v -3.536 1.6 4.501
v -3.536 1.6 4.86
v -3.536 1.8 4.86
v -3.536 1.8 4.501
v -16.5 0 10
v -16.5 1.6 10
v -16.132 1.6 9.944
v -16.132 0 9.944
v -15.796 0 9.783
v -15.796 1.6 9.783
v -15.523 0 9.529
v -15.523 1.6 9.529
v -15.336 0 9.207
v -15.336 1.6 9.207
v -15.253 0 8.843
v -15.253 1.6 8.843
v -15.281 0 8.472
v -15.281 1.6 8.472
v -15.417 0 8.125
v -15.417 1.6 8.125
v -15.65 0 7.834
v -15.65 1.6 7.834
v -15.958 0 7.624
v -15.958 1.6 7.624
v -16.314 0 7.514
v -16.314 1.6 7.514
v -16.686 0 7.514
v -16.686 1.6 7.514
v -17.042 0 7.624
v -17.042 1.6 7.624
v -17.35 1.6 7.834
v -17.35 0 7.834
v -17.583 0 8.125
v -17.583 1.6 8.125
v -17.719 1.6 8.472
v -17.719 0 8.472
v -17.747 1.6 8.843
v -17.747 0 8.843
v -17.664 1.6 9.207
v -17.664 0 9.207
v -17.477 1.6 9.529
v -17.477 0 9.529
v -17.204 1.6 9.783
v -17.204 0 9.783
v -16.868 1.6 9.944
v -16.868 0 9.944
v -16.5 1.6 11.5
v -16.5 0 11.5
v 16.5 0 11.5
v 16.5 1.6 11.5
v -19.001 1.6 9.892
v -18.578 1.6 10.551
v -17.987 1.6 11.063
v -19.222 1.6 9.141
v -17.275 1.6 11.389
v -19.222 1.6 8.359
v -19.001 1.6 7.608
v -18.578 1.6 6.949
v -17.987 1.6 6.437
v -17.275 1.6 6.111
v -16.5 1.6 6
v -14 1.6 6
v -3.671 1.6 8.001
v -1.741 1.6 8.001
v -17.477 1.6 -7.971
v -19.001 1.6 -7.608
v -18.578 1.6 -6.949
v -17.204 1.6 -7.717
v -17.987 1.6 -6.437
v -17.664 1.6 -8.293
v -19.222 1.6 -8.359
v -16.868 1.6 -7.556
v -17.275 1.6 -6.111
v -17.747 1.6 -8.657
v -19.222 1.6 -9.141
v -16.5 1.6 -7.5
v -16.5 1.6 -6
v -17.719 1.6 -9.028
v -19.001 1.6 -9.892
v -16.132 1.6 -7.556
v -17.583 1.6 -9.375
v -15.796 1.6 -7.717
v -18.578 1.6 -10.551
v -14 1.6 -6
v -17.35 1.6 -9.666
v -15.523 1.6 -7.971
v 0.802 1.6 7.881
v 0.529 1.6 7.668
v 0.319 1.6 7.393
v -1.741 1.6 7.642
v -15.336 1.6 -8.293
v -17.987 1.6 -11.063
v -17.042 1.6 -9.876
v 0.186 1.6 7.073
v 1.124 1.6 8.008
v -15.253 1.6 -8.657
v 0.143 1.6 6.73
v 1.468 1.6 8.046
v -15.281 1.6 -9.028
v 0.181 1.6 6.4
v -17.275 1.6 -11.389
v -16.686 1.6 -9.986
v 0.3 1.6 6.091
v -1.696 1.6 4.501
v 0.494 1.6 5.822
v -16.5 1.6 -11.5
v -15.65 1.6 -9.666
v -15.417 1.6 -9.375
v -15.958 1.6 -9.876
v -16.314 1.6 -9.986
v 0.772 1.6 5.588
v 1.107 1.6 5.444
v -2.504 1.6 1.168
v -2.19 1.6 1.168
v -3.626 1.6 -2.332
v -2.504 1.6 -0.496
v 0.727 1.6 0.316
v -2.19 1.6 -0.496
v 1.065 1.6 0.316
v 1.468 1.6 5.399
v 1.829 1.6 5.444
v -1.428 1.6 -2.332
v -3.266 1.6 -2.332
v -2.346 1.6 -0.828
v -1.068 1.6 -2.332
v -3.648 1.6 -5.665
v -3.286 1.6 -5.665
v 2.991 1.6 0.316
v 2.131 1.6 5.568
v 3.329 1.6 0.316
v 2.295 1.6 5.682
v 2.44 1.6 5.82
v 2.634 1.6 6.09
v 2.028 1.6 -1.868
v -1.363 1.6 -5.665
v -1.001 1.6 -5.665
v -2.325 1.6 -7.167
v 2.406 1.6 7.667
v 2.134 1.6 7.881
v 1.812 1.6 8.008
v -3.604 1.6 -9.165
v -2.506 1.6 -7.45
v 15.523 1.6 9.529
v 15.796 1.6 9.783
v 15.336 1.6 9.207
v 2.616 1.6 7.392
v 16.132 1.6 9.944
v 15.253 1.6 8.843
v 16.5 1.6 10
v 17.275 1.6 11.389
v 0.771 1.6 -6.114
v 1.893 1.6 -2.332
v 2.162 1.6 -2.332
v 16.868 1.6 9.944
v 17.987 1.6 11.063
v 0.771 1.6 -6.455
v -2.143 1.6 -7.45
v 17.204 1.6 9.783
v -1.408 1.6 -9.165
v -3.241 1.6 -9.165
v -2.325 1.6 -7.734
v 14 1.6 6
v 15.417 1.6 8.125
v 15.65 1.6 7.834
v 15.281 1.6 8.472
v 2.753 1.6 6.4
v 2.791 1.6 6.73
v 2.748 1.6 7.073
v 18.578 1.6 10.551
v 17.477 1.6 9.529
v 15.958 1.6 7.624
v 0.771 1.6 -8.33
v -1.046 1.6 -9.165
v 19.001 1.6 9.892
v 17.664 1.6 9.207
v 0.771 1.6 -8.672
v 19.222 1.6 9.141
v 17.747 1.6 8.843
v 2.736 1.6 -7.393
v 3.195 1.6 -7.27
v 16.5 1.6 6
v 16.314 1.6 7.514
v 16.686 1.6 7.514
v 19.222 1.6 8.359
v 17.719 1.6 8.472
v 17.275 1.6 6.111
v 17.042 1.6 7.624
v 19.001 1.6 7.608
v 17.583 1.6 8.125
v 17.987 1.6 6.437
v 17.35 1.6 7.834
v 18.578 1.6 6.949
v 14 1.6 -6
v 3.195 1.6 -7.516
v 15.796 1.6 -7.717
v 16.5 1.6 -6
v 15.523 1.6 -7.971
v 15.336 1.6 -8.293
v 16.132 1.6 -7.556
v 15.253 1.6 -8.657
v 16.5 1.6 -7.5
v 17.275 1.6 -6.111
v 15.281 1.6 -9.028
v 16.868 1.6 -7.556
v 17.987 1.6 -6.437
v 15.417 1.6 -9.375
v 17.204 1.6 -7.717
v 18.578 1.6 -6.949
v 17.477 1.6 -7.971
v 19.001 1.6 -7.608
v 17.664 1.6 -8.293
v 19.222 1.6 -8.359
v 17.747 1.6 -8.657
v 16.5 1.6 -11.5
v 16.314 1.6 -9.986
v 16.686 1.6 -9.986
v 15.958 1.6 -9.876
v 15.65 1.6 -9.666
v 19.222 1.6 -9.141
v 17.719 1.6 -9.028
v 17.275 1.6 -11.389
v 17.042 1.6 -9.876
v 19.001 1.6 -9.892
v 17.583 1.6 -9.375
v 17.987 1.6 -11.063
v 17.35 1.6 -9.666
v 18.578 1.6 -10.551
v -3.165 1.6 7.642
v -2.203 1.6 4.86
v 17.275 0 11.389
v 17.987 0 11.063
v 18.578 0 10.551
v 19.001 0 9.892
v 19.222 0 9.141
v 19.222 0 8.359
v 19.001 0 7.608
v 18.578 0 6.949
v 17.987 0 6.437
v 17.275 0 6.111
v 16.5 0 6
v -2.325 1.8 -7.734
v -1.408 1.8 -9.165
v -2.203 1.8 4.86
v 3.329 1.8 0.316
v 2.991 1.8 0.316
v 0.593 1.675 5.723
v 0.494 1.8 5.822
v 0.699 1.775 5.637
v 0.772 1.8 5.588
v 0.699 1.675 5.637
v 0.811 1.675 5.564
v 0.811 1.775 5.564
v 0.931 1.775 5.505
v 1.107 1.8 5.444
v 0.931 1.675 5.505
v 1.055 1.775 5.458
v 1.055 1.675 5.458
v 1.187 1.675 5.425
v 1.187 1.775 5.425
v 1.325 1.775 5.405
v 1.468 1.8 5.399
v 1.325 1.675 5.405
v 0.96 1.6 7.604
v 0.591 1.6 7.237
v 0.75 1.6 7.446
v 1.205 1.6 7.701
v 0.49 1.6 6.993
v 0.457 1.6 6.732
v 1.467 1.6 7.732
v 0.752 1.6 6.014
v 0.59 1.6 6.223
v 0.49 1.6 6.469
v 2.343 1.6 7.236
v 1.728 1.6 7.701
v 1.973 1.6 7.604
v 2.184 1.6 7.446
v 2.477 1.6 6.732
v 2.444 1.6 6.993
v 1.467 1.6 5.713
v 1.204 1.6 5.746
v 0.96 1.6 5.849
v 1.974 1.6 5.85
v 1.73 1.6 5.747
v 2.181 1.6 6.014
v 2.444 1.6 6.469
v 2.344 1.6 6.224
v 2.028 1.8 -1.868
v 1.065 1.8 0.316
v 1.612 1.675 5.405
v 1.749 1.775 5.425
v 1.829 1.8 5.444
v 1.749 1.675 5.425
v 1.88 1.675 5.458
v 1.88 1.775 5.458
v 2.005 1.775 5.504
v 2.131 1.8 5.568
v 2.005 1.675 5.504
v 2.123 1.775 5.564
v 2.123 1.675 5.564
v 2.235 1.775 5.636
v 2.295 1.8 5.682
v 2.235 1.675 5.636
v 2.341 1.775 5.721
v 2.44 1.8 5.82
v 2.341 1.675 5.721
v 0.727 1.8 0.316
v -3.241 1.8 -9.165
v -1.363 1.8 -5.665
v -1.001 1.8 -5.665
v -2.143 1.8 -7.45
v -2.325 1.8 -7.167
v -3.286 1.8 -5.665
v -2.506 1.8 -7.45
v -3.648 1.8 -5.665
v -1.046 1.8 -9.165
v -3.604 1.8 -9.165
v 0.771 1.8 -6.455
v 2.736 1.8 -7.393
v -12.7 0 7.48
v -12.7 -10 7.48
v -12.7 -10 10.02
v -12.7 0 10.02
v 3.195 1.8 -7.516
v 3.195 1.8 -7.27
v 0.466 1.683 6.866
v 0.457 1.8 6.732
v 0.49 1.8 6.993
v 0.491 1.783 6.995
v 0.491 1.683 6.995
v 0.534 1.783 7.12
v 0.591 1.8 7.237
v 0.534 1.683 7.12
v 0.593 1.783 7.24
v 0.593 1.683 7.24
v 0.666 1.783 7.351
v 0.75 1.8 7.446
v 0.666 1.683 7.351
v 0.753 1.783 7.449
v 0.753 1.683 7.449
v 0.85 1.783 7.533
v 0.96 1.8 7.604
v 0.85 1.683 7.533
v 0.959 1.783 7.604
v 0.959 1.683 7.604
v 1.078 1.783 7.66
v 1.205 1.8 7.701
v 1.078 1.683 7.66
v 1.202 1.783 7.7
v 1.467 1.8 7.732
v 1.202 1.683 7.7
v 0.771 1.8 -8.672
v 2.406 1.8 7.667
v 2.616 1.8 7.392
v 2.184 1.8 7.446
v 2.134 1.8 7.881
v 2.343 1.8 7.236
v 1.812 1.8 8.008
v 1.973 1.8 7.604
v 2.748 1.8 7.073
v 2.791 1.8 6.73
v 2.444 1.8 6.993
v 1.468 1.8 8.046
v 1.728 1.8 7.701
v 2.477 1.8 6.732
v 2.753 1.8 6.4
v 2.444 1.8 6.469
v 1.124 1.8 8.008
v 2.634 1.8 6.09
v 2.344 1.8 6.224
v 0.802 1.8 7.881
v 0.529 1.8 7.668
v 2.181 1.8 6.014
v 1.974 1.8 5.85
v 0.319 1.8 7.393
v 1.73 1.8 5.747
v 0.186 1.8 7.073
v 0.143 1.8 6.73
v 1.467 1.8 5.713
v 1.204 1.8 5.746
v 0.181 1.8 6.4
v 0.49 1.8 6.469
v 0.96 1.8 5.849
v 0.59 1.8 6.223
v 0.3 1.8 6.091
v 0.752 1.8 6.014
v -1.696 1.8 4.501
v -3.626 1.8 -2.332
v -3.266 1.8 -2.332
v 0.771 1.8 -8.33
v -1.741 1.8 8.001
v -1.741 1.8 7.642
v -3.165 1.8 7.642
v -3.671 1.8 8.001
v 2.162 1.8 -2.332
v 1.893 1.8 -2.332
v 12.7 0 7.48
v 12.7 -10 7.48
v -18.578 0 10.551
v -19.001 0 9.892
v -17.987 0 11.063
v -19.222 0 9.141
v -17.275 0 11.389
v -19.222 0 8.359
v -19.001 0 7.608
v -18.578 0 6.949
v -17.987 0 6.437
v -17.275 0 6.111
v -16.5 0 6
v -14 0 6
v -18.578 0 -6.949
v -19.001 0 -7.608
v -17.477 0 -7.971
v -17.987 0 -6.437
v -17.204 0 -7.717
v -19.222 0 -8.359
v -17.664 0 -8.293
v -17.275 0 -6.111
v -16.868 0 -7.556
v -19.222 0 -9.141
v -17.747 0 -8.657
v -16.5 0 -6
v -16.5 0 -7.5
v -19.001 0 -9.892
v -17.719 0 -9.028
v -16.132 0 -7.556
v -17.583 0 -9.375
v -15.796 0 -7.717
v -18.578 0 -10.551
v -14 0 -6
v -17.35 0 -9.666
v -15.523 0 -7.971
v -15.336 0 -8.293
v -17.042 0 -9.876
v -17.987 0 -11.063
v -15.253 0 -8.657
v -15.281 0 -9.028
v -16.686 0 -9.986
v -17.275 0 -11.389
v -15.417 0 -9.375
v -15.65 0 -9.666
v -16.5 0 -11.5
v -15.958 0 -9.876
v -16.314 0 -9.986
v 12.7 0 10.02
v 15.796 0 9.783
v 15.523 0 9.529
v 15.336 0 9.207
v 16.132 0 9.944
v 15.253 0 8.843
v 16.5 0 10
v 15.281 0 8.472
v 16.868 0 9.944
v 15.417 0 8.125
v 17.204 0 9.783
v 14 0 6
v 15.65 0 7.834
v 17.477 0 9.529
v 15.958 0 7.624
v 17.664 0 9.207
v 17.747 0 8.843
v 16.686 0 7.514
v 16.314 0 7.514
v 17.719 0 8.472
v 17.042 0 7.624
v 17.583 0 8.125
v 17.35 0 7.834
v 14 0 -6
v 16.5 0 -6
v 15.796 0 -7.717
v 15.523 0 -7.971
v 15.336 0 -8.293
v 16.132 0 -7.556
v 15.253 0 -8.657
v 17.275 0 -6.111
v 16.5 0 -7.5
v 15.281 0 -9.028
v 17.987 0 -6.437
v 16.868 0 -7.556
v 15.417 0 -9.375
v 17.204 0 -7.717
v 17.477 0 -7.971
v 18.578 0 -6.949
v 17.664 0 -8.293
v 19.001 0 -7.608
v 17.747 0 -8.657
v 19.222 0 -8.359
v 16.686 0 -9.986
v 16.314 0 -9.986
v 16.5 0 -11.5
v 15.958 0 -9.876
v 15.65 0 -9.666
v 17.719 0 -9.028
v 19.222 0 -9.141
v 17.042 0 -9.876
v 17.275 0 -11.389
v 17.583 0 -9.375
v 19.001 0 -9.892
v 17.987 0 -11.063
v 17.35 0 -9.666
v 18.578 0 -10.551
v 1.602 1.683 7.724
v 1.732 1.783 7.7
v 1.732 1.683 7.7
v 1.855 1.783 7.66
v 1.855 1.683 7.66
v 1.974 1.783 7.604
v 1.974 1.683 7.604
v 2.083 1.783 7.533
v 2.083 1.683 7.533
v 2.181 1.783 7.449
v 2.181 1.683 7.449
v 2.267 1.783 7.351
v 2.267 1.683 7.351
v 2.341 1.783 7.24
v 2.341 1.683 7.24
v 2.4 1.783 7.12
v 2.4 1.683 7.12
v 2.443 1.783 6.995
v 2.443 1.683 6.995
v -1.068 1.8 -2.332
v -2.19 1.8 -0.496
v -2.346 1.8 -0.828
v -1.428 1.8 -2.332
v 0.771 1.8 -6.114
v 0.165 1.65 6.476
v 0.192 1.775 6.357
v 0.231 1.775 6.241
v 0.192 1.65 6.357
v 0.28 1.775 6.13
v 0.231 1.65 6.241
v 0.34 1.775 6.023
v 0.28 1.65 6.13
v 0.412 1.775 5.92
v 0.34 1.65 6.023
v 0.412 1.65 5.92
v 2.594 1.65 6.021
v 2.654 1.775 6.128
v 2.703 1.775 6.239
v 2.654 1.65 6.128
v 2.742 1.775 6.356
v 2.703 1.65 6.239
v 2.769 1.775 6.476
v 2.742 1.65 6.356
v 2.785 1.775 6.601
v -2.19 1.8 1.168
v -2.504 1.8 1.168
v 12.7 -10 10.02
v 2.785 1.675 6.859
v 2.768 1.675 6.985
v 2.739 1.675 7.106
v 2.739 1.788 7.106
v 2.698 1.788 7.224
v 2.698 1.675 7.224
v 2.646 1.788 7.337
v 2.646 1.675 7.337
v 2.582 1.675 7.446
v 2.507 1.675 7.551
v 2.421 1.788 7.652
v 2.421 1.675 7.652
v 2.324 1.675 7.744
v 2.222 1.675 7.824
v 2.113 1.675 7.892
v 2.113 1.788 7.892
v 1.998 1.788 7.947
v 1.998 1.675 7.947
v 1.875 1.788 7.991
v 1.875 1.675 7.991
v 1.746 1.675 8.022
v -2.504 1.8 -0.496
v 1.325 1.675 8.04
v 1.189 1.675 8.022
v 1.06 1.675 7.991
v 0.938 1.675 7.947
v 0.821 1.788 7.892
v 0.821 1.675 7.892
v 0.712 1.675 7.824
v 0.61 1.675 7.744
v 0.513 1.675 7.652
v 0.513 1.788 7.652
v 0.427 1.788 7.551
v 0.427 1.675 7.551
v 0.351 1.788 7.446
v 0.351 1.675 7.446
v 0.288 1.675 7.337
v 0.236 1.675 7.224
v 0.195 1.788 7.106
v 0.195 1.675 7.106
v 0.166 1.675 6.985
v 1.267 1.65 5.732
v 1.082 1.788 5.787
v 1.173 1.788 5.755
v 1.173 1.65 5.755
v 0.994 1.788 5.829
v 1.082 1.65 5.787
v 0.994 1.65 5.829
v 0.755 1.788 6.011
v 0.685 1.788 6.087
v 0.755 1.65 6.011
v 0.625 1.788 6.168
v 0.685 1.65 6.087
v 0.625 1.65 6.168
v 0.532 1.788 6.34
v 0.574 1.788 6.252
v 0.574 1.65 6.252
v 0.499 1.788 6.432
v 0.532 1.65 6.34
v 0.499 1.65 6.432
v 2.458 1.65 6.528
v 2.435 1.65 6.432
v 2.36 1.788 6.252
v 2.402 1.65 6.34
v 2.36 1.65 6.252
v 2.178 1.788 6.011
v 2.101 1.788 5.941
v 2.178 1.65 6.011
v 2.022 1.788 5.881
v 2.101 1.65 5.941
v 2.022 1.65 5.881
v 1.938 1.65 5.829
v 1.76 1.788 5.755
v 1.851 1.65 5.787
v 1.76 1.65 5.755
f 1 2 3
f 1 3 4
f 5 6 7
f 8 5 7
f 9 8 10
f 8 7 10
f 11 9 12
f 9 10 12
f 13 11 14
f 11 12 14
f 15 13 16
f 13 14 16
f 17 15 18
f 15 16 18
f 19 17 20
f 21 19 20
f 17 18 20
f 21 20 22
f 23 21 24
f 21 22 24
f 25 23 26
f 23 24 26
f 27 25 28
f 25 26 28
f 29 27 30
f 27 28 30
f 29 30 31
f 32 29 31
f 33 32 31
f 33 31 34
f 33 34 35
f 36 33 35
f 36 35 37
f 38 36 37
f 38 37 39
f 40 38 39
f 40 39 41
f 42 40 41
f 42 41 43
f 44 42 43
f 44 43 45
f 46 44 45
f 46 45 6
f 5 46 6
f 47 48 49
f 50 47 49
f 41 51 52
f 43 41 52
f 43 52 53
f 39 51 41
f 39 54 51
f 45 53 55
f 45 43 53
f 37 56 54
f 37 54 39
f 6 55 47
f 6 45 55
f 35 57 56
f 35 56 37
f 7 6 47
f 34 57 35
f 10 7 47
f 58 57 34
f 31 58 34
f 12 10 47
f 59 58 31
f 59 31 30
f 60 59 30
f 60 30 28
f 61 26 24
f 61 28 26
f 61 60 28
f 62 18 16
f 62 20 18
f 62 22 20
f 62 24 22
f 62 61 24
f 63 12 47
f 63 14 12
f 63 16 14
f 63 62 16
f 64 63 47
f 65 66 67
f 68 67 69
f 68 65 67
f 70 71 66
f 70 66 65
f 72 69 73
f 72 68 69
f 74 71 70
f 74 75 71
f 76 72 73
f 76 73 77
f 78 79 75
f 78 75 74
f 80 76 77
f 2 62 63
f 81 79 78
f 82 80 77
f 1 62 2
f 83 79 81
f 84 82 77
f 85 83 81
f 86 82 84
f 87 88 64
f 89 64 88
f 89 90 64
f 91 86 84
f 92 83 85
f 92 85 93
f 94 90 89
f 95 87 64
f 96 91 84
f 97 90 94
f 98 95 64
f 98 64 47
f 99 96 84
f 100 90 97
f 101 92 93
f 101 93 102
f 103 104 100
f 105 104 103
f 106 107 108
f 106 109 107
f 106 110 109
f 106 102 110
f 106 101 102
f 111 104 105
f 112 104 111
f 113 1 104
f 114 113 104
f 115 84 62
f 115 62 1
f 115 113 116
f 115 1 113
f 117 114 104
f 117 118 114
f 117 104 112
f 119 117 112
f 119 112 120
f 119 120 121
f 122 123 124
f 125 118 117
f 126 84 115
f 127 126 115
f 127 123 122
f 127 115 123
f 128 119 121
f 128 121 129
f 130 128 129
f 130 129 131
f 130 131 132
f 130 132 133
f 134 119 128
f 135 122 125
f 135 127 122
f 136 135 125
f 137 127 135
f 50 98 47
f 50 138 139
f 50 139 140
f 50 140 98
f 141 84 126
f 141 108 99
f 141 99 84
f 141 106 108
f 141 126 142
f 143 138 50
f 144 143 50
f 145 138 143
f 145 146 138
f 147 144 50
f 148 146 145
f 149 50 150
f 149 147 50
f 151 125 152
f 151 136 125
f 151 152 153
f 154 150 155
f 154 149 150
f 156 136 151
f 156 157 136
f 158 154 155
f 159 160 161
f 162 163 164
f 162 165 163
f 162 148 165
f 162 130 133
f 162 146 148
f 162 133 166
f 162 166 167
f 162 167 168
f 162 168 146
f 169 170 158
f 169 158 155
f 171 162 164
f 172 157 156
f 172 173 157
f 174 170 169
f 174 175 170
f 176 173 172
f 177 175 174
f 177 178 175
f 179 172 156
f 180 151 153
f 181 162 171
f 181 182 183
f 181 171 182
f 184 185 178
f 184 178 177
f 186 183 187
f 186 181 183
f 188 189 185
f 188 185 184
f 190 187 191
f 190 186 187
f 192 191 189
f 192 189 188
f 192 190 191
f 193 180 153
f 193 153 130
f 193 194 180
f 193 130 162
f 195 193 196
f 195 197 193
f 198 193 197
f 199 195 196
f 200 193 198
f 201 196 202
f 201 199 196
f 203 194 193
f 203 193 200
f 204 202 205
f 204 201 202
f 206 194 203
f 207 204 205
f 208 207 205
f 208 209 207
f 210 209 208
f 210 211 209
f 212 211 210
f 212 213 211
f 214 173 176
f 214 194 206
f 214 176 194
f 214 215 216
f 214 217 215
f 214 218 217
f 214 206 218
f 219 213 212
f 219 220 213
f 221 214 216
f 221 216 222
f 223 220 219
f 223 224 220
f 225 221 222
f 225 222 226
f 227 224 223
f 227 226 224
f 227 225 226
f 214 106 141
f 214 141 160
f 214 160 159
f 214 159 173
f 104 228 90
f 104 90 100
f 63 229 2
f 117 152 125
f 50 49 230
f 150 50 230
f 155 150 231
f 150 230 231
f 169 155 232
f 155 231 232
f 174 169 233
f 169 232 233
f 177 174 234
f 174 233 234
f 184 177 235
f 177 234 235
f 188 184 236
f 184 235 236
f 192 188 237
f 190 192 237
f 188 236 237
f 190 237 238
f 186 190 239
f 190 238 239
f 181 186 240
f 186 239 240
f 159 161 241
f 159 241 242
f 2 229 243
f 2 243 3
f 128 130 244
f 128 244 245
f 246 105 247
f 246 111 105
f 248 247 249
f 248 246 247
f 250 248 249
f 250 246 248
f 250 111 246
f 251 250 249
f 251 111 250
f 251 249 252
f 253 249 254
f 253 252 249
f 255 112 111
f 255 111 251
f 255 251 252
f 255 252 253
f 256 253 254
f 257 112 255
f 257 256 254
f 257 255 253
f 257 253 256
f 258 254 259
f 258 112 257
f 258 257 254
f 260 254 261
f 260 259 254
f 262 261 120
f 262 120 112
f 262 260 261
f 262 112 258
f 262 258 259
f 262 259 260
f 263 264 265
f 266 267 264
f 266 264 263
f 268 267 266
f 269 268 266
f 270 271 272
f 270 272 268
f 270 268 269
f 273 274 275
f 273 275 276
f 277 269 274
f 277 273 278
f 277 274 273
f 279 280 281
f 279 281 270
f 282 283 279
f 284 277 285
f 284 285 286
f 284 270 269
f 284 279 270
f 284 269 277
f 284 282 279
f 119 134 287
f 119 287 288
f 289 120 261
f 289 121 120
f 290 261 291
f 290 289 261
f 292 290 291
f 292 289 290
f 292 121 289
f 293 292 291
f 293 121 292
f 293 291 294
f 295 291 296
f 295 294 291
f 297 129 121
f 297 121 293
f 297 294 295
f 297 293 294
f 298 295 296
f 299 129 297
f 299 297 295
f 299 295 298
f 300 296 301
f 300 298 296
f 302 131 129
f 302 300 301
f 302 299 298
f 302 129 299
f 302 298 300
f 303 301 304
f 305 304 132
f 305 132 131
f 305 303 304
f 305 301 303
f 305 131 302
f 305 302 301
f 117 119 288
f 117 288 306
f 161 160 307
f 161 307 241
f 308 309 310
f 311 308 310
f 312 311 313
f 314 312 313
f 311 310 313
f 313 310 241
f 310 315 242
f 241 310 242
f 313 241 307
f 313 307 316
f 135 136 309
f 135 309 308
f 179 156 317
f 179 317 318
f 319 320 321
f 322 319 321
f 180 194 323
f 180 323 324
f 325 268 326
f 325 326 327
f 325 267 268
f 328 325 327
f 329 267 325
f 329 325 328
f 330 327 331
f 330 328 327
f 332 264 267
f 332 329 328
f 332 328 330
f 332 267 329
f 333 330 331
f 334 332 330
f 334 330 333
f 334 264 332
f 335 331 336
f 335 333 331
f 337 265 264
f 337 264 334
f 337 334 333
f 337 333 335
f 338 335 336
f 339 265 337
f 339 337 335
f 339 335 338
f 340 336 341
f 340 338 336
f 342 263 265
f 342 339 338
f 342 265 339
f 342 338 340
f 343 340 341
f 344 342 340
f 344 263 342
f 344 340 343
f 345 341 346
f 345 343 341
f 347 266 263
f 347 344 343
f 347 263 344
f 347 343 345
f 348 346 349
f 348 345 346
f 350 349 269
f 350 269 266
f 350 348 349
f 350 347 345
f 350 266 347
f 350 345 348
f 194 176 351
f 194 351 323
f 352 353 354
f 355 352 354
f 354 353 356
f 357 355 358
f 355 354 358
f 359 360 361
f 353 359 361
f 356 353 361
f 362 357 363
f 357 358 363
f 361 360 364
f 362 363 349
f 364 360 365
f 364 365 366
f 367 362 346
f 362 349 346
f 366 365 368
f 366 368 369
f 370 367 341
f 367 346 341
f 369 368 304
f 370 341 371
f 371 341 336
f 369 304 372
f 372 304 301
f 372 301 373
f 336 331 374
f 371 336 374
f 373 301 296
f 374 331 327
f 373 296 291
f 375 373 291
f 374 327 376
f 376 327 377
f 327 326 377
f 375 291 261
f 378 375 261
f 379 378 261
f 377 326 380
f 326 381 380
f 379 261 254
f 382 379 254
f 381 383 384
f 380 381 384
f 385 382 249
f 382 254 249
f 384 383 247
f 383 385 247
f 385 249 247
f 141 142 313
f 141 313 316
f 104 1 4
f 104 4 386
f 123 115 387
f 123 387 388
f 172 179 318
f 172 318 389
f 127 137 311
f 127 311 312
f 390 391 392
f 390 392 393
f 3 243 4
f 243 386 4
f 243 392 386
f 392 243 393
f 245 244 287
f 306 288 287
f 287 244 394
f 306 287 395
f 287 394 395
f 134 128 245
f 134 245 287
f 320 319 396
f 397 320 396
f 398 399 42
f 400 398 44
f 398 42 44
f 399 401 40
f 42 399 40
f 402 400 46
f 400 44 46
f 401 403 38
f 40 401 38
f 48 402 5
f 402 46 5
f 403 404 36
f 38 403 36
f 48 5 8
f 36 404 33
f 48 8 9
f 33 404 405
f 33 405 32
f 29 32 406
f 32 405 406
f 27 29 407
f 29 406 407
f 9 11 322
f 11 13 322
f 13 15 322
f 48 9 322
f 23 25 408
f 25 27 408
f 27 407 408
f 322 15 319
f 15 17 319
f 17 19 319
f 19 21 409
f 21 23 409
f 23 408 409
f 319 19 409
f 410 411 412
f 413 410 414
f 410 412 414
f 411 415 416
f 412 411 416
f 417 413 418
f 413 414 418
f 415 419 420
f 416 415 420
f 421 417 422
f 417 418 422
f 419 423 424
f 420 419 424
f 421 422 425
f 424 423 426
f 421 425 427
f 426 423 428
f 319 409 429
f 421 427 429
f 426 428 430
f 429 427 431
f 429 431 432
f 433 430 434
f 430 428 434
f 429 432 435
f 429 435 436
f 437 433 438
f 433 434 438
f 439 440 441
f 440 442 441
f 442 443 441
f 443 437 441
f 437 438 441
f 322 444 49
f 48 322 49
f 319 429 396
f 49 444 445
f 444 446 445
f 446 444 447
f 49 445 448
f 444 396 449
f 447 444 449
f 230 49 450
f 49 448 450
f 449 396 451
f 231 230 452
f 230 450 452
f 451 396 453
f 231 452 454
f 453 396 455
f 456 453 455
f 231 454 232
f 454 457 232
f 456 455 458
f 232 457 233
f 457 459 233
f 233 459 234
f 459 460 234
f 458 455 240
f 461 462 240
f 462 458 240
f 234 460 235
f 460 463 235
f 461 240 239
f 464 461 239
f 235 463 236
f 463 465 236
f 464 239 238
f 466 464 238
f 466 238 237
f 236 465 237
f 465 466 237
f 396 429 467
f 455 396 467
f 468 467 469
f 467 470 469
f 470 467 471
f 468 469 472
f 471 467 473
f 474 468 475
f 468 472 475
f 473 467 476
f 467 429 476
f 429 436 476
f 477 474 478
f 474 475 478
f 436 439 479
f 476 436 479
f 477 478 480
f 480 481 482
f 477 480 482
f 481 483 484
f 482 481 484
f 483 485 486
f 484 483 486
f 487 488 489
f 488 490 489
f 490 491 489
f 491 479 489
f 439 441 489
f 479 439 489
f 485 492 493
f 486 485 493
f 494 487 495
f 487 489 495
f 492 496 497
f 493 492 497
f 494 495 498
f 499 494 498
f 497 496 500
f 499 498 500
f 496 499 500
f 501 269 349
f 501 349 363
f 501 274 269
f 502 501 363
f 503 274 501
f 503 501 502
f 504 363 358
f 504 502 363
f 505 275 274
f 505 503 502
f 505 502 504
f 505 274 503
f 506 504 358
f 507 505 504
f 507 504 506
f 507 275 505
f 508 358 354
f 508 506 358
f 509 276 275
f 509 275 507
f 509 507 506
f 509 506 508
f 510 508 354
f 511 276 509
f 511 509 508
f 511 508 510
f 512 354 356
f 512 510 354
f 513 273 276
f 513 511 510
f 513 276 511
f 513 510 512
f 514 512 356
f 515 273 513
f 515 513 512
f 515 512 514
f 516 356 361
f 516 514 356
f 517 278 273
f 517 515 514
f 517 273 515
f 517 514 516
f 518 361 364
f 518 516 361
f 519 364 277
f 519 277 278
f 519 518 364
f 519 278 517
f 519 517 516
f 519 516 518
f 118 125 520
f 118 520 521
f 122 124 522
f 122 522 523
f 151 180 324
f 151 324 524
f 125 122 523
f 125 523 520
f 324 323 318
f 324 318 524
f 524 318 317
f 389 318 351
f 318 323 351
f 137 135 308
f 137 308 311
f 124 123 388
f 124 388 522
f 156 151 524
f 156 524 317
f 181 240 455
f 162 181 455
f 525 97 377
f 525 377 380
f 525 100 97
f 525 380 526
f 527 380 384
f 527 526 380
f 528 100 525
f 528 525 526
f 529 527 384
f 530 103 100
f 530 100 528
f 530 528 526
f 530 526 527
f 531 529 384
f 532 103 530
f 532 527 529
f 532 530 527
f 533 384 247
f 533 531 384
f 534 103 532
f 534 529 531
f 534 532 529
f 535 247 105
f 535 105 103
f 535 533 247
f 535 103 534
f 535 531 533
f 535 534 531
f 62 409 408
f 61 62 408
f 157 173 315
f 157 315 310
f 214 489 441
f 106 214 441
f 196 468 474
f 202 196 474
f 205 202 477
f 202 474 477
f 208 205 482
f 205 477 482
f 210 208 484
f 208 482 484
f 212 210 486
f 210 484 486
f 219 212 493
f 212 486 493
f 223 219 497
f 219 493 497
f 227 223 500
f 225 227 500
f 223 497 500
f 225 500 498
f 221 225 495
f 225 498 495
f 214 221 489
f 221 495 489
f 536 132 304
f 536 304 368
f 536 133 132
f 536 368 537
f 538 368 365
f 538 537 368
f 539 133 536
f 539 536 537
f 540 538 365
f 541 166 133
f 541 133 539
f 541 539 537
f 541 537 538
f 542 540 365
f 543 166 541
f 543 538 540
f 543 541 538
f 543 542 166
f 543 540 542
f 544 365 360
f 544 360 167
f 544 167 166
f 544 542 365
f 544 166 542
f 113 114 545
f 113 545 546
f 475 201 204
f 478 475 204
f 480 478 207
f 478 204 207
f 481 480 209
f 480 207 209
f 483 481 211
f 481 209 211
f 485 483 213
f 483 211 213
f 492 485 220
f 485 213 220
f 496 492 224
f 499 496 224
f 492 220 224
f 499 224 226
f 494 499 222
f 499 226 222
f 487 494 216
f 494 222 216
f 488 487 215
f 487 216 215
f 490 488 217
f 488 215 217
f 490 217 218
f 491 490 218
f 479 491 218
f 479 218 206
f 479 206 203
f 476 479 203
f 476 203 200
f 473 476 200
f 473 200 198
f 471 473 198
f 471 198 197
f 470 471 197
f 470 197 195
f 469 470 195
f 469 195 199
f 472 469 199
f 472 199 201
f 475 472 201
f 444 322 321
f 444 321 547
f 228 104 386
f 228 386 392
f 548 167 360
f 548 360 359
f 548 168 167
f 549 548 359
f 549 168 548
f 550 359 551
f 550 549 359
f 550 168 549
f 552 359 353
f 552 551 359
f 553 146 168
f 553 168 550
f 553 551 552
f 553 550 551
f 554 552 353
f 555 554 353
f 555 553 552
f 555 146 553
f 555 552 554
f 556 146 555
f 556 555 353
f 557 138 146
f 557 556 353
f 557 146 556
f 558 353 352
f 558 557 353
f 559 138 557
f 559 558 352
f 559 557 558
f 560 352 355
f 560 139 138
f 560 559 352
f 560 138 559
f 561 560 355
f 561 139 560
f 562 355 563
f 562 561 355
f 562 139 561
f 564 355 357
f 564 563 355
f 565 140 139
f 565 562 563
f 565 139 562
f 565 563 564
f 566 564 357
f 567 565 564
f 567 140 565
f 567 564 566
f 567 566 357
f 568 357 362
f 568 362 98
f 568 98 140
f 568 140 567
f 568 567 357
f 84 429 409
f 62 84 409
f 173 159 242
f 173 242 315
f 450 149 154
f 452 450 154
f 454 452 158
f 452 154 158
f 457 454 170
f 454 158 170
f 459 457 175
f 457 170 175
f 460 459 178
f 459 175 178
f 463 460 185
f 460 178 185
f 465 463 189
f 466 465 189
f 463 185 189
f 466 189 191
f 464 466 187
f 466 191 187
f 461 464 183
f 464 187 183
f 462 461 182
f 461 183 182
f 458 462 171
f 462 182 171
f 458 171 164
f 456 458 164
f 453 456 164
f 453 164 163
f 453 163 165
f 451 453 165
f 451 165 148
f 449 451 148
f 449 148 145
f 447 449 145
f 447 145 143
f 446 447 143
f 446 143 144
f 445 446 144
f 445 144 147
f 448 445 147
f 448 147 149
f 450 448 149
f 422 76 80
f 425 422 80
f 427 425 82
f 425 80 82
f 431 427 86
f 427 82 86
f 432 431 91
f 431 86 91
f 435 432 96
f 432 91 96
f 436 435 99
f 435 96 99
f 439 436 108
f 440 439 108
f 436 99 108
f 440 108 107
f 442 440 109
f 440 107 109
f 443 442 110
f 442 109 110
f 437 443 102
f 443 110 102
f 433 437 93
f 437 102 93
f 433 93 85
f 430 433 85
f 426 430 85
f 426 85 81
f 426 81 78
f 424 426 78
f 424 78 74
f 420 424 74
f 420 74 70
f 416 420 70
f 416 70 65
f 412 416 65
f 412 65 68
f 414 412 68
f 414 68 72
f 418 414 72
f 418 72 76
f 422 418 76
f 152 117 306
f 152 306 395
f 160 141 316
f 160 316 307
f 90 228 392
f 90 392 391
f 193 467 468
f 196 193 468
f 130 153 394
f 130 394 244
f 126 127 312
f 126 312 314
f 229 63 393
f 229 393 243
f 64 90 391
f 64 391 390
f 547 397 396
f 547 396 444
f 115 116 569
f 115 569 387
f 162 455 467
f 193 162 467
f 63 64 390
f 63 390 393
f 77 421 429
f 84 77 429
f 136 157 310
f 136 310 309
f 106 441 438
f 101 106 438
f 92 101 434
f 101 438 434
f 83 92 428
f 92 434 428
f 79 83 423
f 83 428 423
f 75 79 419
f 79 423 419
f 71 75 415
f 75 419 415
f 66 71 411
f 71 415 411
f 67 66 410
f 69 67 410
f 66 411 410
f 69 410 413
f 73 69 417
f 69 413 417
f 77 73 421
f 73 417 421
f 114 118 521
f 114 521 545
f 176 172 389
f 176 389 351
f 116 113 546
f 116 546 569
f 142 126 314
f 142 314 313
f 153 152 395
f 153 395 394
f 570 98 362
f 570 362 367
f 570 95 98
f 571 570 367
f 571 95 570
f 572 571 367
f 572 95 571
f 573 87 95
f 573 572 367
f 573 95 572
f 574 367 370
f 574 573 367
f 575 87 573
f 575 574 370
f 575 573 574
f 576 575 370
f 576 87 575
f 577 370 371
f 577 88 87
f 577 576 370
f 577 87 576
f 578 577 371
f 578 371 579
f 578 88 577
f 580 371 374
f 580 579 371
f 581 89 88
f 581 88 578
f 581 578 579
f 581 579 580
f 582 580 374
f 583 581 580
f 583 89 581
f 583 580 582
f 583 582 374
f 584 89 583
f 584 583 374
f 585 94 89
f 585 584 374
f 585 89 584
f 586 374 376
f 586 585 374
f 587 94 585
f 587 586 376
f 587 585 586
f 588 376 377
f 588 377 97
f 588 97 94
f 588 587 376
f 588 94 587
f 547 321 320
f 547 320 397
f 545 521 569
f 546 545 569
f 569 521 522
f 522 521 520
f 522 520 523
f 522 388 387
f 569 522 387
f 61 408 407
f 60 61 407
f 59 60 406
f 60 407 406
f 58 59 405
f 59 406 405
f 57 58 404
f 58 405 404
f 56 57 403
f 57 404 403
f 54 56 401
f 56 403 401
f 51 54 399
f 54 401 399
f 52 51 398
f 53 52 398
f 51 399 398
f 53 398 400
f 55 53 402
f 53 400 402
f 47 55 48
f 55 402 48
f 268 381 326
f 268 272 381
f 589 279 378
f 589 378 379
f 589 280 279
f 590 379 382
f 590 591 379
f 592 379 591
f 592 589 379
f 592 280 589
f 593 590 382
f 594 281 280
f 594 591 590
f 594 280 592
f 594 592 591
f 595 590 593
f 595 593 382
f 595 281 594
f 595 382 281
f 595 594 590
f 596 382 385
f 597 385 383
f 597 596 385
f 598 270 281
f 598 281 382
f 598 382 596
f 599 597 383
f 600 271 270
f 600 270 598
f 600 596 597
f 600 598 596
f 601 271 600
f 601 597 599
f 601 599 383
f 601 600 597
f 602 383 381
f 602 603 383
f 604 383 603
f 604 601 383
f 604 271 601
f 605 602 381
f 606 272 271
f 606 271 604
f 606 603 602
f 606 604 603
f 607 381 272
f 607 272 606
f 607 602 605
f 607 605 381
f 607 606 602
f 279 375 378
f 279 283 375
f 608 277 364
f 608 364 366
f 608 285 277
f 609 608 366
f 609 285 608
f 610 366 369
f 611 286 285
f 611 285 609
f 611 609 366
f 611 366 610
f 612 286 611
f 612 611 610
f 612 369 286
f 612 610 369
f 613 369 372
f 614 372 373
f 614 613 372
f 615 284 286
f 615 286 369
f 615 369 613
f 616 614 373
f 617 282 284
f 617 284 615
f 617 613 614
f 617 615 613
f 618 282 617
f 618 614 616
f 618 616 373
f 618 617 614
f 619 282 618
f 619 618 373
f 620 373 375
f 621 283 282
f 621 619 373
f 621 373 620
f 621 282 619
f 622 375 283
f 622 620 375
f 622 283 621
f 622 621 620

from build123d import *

# Parameters (mm, degrees)
BOSS_EXTRUDE1_DEPTH = 1.6
SKETCH2_R           = 1.25
CUT_EXTRUDE1_DEPTH  = 23.480491543
SKETCH3_W           = 25.4
SKETCH3_H           = 2.54
BOSS_EXTRUDE2_DEPTH = 10
BOSS_EXTRUDE3_DEPTH = 0.2


with BuildPart() as part:
    # Sketch1 → Boss-Extrude1 (new body)
    with BuildSketch(Plane(origin=(0, 0, 0), x_dir=(1, 0, 0), z_dir=(0, 1, 0))):
        with BuildLine():
            Line((-14, 11.5), (-16.5, 11.5))
            ThreePointArc((-16.5, 11.5), (-19.25, 8.75), (-16.5, 6))
            Line((-16.5, 6), (-14, 6))
            Line((-14, 6), (-14, -6))
            Line((-14, -6), (-16.5, -6))
            ThreePointArc((-16.5, -6), (-19.25, -8.75), (-16.5, -11.5))
            Line((-16.5, -11.5), (-14, -11.5))
            Line((-14, -11.5), (14, -11.5))
            Line((14, -11.5), (16.5, -11.5))
            ThreePointArc((16.5, -11.5), (19.25, -8.75), (16.5, -6))
            Line((16.5, -6), (14, -6))
            Line((14, -6), (14, 6))
            Line((14, 6), (16.5, 6))
            ThreePointArc((16.5, 6), (19.25, 8.75), (16.5, 11.5))
            Line((16.5, 11.5), (14, 11.5))
            Line((14, 11.5), (-14, 11.5))
        make_face()
    extrude(amount=BOSS_EXTRUDE1_DEPTH)

    # Sketch2 → Cut-Extrude1 (cut, through all)
    with BuildSketch(Plane(origin=(0, 1.6, 0), x_dir=(1, 0, 0), z_dir=(0, 1, 0))):
        with Locations(Location((-16.5, 8.75, 0), (0, 0, 270))):
            Circle(SKETCH2_R)
        with Locations(Location((16.5, 8.75, 0), (0, 0, 270))):
            Circle(SKETCH2_R)
        with Locations(Location((16.5, -8.75, 0), (0, 0, 270))):
            Circle(SKETCH2_R)
        with Locations(Location((-16.5, -8.75, 0), (0, 0, 270))):
            Circle(SKETCH2_R)
    extrude(amount=-CUT_EXTRUDE1_DEPTH, mode=Mode.SUBTRACT)

    # Sketch3 → Boss-Extrude2 (add)
    with BuildSketch(Plane.XZ):
        with Locations((0, 8.75)):
            Rectangle(SKETCH3_W, SKETCH3_H)
    extrude(amount=BOSS_EXTRUDE2_DEPTH)

    # Sketch4 → Boss-Extrude3 (add)
    # profile 1 of 6: a face of its own
    with BuildSketch(Plane(origin=(0, 1.6, 0), x_dir=(1, 0, 0), z_dir=(0, 1, 0))):
        Polygon((-3.603530873, 9.165262271), (-3.241050905, 9.165262271), (-2.324684719, 7.733571566), (-1.408318533, 9.165262271), (-1.045838565, 9.165262271), (-2.143094174, 7.450318361), (-1.00096677, 5.665262271), (-1.363446738, 5.665262271), (-2.324684719, 7.167065156), (-3.2859227, 5.665262271), (-3.648402668, 5.665262271), (-2.505574142, 7.450318361), align=None)
    # profile 2 of 6: a face of its own
    with BuildSketch(Plane(origin=(0, 1.6, 0), x_dir=(1, 0, 0), z_dir=(0, 1, 0))):
        Polygon((0.771469127, 6.455426534), (2.736012396, 7.392826374), (0.771469127, 8.330226214), (0.771469127, 8.671672528), (3.19454605, 7.515522688), (3.19454605, 7.27013006), (0.771469127, 6.11398022), align=None)
    # profile 3 of 6: a face of its own
    with BuildSketch(Plane(origin=(0, 1.6, 0), x_dir=(1, 0, 0), z_dir=(0, 1, 0))):
        Polygon((-3.62596677, 2.331928938), (-3.26629129, 2.331928938), (-2.346419495, 0.828022688), (-1.427949944, 2.331928938), (-1.068274463, 2.331928938), (-2.190069335, 0.495690957), (-2.190069335, -1.168071062), (-2.504171899, -1.168071062), (-2.504171899, 0.495690957), align=None)
    # profile 4 of 6: a face of its own
    with BuildSketch(Plane(origin=(0, 1.6, 0), x_dir=(1, 0, 0), z_dir=(0, 1, 0))):
        Polygon((1.893263999, 2.331928938), (2.162494768, 2.331928938), (3.329161435, -0.315506959), (2.990519608, -0.315506959), (2.027879383, 1.868487432), (1.065239159, -0.315506959), (0.726597332, -0.315506959), align=None)
    # profile 5 of 6: a face of its own
    with BuildSketch(Plane(origin=(0, 1.6, 0), x_dir=(1, 0, 0), z_dir=(0, 1, 0))):
        Polygon((-3.536223181, -4.860378754), (-3.536223181, -4.501404395), (-1.696479591, -4.501404395), (-3.164628629, -7.642430036), (-1.741351386, -7.642430036), (-1.741351386, -8.001404395), (-3.670838565, -8.001404395), (-2.202689527, -4.860378754), align=None)
    # profile 6 of 6: a face of its own
    with BuildSketch(Plane(origin=(0, 1.6, 0), x_dir=(1, 0, 0), z_dir=(0, 1, 0))):
        with BuildLine():
            add(Edge.make_bspline(
                [(1.468384191, -5.398840293), (1.516375464, -5.399862184), (1.610474622, -5.401865863), (1.748282507, -5.423280828), (1.879827643, -5.456028193), (2.005613835, -5.501299755), (2.124030131, -5.561981705), (2.236801375, -5.634390996), (2.343618384, -5.72017359), (2.407641413, -5.786531658), (2.440138999, -5.820214492)],
                knots=[0, 0, 0, 0, 1.054011418, 2.066658804, 3.057071809, 4.030435133, 4.997543892, 5.974964718, 6.972108034, 8, 8, 8, 8], degree=3))
            add(Edge.make_bspline(
                [(2.440138999, -5.820214492), (2.468120953, -5.852428477), (2.523543333, -5.91623302), (2.594609052, -6.019688632), (2.655830612, -6.126828733), (2.704893573, -6.23907606), (2.743578597, -6.355450731), (2.771044293, -6.476352742), (2.787381228, -6.601515089), (2.789584195, -6.686518927), (2.790699896, -6.729569459)],
                knots=[0, 0, 0, 0, 1.025258237, 2.030674902, 3.01204498, 3.988269485, 4.97094183, 5.956517959, 6.965070386, 8, 8, 8, 8], degree=3))
            add(Edge.make_bspline(
                [(2.790699896, -6.729569459), (2.789718559, -6.772869517), (2.787779391, -6.85843245), (2.769435774, -6.984451816), (2.740904688, -7.106646639), (2.70007285, -7.224505333), (2.647714741, -7.33838816), (2.583824053, -7.447797709), (2.507952436, -7.552949843), (2.421948439, -7.652951681), (2.326896563, -7.745117896), (2.223780415, -7.825446165), (2.114626381, -7.89426769), (1.997983028, -7.949704105), (1.874915541, -7.993413806), (1.745158473, -8.024113822), (1.608913403, -8.042675506), (1.515886181, -8.045059079), (1.468384191, -8.04627619)],
                knots=[0, 0, 0, 0, 0.998656419, 1.973391657, 2.932242238, 3.890759089, 4.846373663, 5.82037756, 6.809684879, 7.83454468, 8.860553229, 9.859544525, 10.845671541, 11.83227036, 12.833544569, 13.85385346, 14.904124723, 16, 16, 16, 16], degree=3))
            add(Edge.make_bspline(
                [(1.468384191, -8.04627619), (1.420649472, -8.045054994), (1.327158612, -8.04266322), (1.19043263, -8.024185937), (1.060443011, -7.993427954), (0.937214412, -7.949560461), (0.820069566, -7.894265918), (0.710283069, -7.825654228), (0.607083153, -7.745094073), (0.512011169, -7.652958136), (0.426012563, -7.55294818), (0.350139555, -7.447798141), (0.286249229, -7.338388048), (0.233891025, -7.224505363), (0.193059212, -7.106646631), (0.164528119, -6.984451818), (0.146184505, -6.85843245), (0.144245336, -6.772869517), (0.143263999, -6.729569459)],
                knots=[0, 0, 0, 0, 1.099876186, 2.154163076, 3.173186993, 4.173200201, 5.163417411, 6.152872554, 7.150605724, 8.17532212, 9.198891216, 10.186952605, 11.159729845, 12.11414092, 13.071450619, 14.029093627, 15.002601286, 16, 16, 16, 16], degree=3))
            add(Edge.make_bspline(
                [(0.143263999, -6.729569459), (0.144387309, -6.686752914), (0.146611271, -6.601983511), (0.16293178, -6.477056451), (0.190290336, -6.356359061), (0.229021733, -6.240433585), (0.278536924, -6.128678149), (0.338898211, -6.021273318), (0.410688844, -5.918285518), (0.465890796, -5.854563438), (0.493824896, -5.822317857)],
                knots=[0, 0, 0, 0, 1.031353054, 2.041901799, 3.029428768, 4.008703097, 4.981709435, 5.96992636, 6.972712378, 8, 8, 8, 8], degree=3))
            add(Edge.make_bspline(
                [(0.493824896, -5.822317857), (0.526273487, -5.788342918), (0.590089351, -5.721525221), (0.697438079, -5.635992697), (0.8099319, -5.562076623), (0.929656826, -5.502600408), (1.055339684, -5.45576189), (1.187558927, -5.423196375), (1.325834442, -5.40194302), (1.420394063, -5.399884842), (1.468384191, -5.398840293)],
                knots=[0, 0, 0, 0, 1.027980169, 2.021703884, 2.998553061, 3.971491411, 4.943284454, 5.930300938, 6.949603206, 8, 8, 8, 8], degree=3))
        make_face()
        with BuildLine():
            add(Edge.make_bspline(
                [(1.466981948, -5.712942857), (1.433044336, -5.713907449), (1.366045208, -5.715811731), (1.267425623, -5.730295636), (1.172485469, -5.75324314), (1.081044625, -5.785847196), (0.993411452, -5.827946095), (0.90950205, -5.879654455), (0.82906961, -5.940287412), (0.753687547, -6.009750083), (0.684505235, -6.085629078), (0.624027258, -6.166477437), (0.572602152, -6.250983783), (0.529761993, -6.339235994), (0.497854805, -6.432128408), (0.474681782, -6.528609039), (0.460211542, -6.628874456), (0.458325163, -6.697035474), (0.457366563, -6.731672825)],
                knots=[0, 0, 0, 0, 1.021534396, 2.016698045, 2.994645724, 3.958388632, 4.93408049, 5.916473867, 6.921342795, 7.962252576, 8.998418191, 10.008913653, 10.997312074, 11.973003931, 12.956656626, 13.948281152, 14.957379055, 16, 16, 16, 16], degree=3))
            add(Edge.make_bspline(
                [(0.457366563, -6.731672825), (0.458973387, -6.776424852), (0.462162631, -6.865249258), (0.488097867, -6.99606038), (0.531484147, -7.121642232), (0.590071427, -7.241258618), (0.663477646, -7.351930896), (0.749964712, -7.450602381), (0.848604413, -7.535788192), (0.958220913, -7.606469038), (1.076575231, -7.662628793), (1.201831552, -7.702427769), (1.332472246, -7.728299462), (1.421752977, -7.730870936), (1.466981948, -7.732173626)],
                knots=[0, 0, 0, 0, 1.016792936, 2.018143844, 3.017858371, 4.030088057, 5.03801393, 6.028138512, 7.003788237, 7.991172063, 8.984598303, 9.972568034, 10.972917682, 12, 12, 12, 12], degree=3))
            add(Edge.make_bspline(
                [(1.466981948, -7.732173626), (1.512208316, -7.730863346), (1.601483912, -7.728276889), (1.731943089, -7.702558069), (1.856857061, -7.662454409), (1.975088449, -7.606532199), (2.084655052, -7.535519784), (2.184004173, -7.451083407), (2.269752785, -7.351669556), (2.343086389, -7.241112027), (2.402633132, -7.121827675), (2.445816334, -6.996037202), (2.47181392, -6.86525516), (2.474994749, -6.77642683), (2.476597332, -6.731672825)],
                knots=[0, 0, 0, 0, 1.02726834, 2.027799167, 3.010890988, 4.004497153, 4.992059811, 5.971914811, 6.958719428, 7.966827853, 8.981595046, 9.981490638, 10.983022906, 12, 12, 12, 12], degree=3))
            add(Edge.make_bspline(
                [(2.476597332, -6.731672825), (2.475639062, -6.697035267), (2.473753333, -6.628873841), (2.459278369, -6.528611388), (2.436122829, -6.432119791), (2.404151212, -6.339267788), (2.361497198, -6.250755284), (2.309080405, -6.166725557), (2.248849379, -6.085349011), (2.178832258, -6.00999537), (2.103528881, -5.940260333), (2.023063842, -5.879630944), (1.939278864, -5.828173348), (1.851900281, -5.785487108), (1.760447714, -5.753539767), (1.665640584, -5.730163136), (1.567441774, -5.715872939), (1.500682731, -5.713925798), (1.466981948, -5.712942857)],
                knots=[0, 0, 0, 0, 1.042956736, 2.052379634, 3.044323526, 4.02829302, 5.004299113, 5.996692471, 7.007513377, 8.048758398, 9.090003419, 10.095195979, 11.07790575, 12.047570684, 13.018257071, 13.989683339, 14.985167495, 16, 16, 16, 16], degree=3))
        make_face(mode=Mode.SUBTRACT)
    extrude(amount=BOSS_EXTRUDE3_DEPTH)


solid = part.part
